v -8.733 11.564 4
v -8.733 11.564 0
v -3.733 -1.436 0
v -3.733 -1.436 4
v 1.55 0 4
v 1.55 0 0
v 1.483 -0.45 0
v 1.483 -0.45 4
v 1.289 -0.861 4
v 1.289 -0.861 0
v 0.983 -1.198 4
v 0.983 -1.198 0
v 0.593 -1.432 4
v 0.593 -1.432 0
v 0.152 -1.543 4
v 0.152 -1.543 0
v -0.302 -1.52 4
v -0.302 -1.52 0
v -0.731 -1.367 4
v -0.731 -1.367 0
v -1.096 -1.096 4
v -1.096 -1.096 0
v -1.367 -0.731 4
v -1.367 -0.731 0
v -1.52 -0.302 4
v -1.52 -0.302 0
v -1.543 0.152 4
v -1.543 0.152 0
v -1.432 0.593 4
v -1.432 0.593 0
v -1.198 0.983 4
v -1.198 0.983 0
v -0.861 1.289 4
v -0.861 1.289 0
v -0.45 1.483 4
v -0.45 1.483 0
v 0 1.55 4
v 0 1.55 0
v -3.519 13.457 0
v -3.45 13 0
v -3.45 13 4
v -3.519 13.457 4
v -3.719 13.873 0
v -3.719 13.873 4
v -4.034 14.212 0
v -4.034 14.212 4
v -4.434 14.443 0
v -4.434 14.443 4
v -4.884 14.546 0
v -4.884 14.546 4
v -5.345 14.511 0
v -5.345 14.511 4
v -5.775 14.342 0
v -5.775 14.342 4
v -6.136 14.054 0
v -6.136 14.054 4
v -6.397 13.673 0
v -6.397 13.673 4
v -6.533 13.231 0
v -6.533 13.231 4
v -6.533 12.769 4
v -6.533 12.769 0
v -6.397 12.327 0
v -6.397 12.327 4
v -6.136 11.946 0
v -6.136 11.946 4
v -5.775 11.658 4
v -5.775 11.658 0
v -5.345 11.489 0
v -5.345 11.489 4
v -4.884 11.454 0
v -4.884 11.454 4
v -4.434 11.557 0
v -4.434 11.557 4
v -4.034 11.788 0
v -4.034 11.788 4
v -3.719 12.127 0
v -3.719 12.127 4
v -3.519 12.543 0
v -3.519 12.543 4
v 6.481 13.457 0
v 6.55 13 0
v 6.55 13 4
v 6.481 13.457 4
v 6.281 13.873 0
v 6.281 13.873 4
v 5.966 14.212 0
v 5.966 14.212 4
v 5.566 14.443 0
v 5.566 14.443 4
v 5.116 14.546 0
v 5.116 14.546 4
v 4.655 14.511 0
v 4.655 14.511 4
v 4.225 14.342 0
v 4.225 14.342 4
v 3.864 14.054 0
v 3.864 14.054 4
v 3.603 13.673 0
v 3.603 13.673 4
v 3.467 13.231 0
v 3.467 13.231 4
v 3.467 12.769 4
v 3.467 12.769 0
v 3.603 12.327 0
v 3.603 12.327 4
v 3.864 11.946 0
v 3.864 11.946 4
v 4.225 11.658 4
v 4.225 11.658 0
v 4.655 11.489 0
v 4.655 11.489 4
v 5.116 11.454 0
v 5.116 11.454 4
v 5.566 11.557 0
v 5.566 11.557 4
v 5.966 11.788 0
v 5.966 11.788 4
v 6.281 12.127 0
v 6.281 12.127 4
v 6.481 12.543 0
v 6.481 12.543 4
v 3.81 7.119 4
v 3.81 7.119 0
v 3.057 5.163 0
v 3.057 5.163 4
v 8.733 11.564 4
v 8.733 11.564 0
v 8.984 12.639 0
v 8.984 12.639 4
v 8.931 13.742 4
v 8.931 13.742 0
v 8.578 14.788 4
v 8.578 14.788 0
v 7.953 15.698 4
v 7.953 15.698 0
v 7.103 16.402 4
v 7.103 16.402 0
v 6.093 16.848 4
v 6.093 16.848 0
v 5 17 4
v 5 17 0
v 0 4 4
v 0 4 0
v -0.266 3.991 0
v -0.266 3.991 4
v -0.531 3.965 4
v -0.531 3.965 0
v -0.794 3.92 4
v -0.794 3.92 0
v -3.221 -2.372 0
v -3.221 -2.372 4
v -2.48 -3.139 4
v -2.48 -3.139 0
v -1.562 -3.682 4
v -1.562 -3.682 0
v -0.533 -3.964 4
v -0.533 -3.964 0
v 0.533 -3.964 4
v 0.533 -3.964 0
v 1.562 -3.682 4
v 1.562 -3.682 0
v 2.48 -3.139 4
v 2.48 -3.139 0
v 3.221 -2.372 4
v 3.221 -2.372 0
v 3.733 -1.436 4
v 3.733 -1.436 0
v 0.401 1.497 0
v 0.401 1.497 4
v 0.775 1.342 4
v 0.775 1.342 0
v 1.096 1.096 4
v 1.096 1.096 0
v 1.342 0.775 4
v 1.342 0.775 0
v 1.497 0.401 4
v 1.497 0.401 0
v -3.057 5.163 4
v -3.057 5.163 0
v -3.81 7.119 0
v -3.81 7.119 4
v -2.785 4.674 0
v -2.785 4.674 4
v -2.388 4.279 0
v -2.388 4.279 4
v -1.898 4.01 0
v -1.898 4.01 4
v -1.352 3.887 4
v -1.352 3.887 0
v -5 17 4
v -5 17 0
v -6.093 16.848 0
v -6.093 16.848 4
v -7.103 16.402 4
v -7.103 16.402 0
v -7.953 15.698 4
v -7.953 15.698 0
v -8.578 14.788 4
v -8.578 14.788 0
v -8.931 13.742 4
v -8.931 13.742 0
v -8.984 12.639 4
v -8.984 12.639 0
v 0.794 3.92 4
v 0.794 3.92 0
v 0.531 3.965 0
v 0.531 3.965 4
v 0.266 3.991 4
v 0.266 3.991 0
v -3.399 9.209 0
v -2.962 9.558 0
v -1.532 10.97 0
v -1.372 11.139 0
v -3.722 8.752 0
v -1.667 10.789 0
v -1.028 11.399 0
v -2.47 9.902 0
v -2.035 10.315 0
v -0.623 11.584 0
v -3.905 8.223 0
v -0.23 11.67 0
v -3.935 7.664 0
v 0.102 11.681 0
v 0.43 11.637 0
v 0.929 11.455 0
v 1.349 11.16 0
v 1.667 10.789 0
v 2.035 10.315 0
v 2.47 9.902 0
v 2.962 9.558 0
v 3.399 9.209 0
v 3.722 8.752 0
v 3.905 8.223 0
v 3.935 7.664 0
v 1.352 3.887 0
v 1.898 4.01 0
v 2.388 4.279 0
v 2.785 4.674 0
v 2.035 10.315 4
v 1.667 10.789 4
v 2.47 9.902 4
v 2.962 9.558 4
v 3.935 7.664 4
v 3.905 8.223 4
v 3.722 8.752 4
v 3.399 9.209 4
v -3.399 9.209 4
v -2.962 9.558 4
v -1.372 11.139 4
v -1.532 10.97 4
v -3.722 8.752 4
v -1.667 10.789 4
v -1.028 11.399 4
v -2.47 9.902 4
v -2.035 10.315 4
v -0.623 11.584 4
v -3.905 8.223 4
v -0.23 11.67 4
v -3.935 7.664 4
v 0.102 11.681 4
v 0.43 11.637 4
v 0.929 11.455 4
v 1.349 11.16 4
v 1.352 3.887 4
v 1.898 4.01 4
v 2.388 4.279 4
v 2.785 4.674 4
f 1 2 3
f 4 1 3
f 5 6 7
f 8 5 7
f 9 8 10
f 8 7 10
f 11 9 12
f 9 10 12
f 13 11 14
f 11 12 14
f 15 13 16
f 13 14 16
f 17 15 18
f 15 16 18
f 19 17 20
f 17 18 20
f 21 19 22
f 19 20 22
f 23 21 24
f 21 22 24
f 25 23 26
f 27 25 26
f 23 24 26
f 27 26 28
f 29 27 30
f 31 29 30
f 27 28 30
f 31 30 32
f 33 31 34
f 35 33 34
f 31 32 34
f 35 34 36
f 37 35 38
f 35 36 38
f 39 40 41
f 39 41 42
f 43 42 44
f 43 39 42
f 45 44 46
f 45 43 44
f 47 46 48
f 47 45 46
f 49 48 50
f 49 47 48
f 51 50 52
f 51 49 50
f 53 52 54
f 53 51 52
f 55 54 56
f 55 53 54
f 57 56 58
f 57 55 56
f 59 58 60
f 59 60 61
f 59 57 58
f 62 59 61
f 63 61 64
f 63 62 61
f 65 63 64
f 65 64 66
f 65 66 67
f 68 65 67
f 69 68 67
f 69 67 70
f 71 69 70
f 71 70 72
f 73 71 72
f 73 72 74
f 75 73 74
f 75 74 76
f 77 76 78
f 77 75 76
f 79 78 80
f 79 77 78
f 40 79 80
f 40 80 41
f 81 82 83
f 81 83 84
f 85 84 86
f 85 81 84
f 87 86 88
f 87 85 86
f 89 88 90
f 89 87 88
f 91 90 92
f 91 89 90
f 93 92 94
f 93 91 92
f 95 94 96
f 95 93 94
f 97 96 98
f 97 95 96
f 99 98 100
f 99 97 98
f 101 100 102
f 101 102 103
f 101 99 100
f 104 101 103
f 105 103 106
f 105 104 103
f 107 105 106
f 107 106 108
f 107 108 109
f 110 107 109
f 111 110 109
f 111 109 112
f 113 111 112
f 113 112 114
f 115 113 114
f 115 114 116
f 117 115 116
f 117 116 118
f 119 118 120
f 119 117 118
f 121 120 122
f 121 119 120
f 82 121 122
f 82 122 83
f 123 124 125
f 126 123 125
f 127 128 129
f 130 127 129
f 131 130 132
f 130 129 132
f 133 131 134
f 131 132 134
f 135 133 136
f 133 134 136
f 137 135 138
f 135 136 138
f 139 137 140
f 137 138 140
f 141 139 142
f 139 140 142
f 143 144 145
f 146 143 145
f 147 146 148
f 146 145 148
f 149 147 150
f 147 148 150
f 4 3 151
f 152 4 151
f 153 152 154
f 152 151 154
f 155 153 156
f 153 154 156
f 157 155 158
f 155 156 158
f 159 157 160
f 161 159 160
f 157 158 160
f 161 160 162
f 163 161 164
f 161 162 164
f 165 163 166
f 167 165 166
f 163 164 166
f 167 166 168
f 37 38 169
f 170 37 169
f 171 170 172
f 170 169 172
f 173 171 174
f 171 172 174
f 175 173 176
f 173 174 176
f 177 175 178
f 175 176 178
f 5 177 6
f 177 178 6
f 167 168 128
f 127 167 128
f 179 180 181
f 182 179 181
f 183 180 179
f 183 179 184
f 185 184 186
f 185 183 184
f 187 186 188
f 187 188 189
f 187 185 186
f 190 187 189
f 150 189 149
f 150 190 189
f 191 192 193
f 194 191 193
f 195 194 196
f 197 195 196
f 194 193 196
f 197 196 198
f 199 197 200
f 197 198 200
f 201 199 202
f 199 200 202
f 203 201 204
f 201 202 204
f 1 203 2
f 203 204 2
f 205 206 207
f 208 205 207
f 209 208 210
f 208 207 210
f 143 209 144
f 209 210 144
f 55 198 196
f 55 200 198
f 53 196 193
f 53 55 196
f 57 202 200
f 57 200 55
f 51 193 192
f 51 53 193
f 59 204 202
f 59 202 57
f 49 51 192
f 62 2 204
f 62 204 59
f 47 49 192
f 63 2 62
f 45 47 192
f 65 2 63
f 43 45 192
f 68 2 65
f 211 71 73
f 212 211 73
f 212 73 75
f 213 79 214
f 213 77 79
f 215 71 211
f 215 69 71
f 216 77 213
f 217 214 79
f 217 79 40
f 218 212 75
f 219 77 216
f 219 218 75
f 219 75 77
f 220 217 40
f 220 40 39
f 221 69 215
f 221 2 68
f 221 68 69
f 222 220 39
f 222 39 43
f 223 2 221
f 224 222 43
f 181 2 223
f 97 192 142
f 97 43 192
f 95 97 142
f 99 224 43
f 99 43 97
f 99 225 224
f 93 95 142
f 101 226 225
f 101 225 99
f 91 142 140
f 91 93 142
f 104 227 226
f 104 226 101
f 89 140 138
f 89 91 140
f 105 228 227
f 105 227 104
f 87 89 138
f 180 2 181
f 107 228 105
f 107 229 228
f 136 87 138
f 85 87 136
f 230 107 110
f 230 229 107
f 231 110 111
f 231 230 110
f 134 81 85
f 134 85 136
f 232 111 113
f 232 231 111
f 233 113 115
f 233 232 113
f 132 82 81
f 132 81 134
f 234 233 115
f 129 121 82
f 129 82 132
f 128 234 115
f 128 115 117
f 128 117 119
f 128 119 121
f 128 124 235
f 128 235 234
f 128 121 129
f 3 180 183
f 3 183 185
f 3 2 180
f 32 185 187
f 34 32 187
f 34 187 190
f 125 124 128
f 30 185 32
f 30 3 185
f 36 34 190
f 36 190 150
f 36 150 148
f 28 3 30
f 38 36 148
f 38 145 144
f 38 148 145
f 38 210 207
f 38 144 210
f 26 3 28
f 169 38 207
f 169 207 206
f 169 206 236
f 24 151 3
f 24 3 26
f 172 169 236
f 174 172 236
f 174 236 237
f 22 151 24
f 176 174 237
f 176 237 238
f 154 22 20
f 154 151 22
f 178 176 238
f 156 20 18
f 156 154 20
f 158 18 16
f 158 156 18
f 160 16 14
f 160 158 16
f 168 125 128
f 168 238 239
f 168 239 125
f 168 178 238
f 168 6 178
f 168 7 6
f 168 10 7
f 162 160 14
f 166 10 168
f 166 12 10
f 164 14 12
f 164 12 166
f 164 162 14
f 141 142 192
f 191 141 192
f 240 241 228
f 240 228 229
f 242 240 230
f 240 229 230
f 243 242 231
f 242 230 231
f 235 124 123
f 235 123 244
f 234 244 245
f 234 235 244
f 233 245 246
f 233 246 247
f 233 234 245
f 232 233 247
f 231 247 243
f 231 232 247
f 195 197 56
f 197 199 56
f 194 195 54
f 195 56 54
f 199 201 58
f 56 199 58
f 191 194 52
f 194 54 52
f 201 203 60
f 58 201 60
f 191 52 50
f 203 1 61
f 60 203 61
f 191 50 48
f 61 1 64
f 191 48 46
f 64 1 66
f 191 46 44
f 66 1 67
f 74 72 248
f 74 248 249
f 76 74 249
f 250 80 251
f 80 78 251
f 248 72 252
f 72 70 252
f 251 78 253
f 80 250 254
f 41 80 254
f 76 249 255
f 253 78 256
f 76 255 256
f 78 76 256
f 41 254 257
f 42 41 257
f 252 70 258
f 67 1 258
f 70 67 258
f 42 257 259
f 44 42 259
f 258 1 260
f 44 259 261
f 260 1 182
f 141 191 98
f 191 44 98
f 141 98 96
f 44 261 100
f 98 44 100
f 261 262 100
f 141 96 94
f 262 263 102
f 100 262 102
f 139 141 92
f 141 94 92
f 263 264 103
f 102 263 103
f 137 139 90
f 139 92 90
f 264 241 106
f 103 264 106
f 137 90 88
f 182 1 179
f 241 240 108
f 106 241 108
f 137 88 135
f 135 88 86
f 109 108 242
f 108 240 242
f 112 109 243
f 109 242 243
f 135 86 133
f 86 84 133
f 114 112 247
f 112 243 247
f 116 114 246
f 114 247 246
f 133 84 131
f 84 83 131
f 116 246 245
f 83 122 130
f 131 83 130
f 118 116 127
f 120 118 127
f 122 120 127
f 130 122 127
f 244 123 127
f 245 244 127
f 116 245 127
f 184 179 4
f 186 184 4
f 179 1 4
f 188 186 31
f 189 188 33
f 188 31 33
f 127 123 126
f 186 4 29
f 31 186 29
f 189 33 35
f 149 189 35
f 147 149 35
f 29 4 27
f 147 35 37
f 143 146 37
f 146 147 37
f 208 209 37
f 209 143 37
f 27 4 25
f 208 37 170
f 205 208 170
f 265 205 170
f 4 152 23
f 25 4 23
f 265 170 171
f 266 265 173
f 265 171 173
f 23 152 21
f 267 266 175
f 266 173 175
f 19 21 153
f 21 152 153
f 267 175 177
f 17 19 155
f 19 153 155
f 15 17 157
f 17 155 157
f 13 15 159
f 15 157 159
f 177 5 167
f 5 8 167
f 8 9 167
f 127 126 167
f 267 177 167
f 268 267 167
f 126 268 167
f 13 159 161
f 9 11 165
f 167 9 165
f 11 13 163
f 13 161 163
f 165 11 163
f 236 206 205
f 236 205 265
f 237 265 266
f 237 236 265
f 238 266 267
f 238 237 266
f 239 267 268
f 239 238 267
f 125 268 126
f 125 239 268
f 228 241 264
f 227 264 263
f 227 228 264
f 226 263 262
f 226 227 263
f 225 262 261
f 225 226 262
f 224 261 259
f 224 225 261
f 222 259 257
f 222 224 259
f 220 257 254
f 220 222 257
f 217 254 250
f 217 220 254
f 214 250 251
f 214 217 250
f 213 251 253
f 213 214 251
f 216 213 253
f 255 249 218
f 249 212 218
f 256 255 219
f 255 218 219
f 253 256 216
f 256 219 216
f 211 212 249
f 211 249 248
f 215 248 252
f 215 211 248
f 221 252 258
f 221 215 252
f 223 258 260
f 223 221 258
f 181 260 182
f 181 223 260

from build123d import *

# Parameters (mm, degrees)
SKETCH_1_R      = 4
SKETCH_1_R_2    = 1.55
EXTRUDE_1_DEPTH = 4
FILLET_1_R      = 2
FILLET_2_R      = 2


with BuildPart() as part:
    # 草图1 → 凸台-拉伸1 (new body)
    # profile 1 of 8: a face of its own
    with BuildSketch(Plane.XY):
        with BuildLine():
            ThreePointArc((-3.733382425, -1.435916317), (-3.830813532, 1.151028966), (-2.323665602, 3.25585291))
            Line((-2.323665602, 3.25585291), (-4.54302561, 9.026188932))
            ThreePointArc((-4.54302561, 9.026188932), (-7.072182387, 9.578587988), (-8.733382425, 11.564083683))
            Line((-8.733382425, 11.564083683), (-3.733382425, -1.435916317))
        make_face()
    # profile 2 of 8: a face of its own
    with BuildSketch(Plane.XY):
        with BuildLine():
            Line((4.54302561, 9.026188932), (2.323665602, 3.25585291))
            ThreePointArc((2.323665602, 3.25585291), (3.556308649, 1.831029436), (4, 0))
            ThreePointArc((4, 0), (3.932780804, -0.730229519), (3.733382425, -1.435916317))
            Line((3.733382425, -1.435916317), (8.733382425, 11.564083683))
            ThreePointArc((8.733382425, 11.564083683), (7.072182387, 9.578587988), (4.54302561, 9.026188932))
        make_face()
    # profile 3 of 8: a face of its own
    with BuildSketch(Plane.XY):
        with Locations((5, 13)):
            Circle(SKETCH_1_R)
        with Locations((5, 13)):
            Circle(SKETCH_1_R_2, mode=Mode.SUBTRACT)
    # profile 4 of 8: a face of its own
    with BuildSketch(Plane.XY):
        with Locations((-5, 13)):
            Circle(SKETCH_1_R)
        with Locations((-5, 13)):
            Circle(SKETCH_1_R_2, mode=Mode.SUBTRACT)
    # profile 5 of 8: a face of its own
    with BuildSketch(Plane.XY):
        with BuildLine():
            Line((-1, 13), (0, 13))
            Line((0, 13), (0, 17))
            Line((0, 17), (-5, 17))
            ThreePointArc((-5, 17), (-2.171572875, 15.828427125), (-1, 13))
        make_face()
    # profile 6 of 8: a face of its own
    with BuildSketch(Plane.XY):
        with BuildLine():
            Line((0, 17), (0, 13))
            Line((0, 13), (1, 13))
            ThreePointArc((1, 13), (2.171572875, 15.828427125), (5, 17))
            Line((5, 17), (0, 17))
        make_face()
    # profile 7 of 8: a face of its own
    with BuildSketch(Plane.XY):
        with BuildLine():
            ThreePointArc((2.323665602, 3.25585291), (1.219956631, 3.809423292), (0, 4))
            ThreePointArc((0, 4), (-1.219956631, 3.809423292), (-2.323665602, 3.25585291))
            ThreePointArc((-2.323665602, 3.25585291), (-3.830813532, 1.151028966), (-3.733382425, -1.435916317))
            ThreePointArc((-3.733382425, -1.435916317), (0, -4), (3.733382425, -1.435916317))
            ThreePointArc((3.733382425, -1.435916317), (3.932780804, -0.730229519), (4, 0))
            ThreePointArc((4, 0), (3.556308649, 1.831029436), (2.323665602, 3.25585291))
        make_face()
        with BuildLine():
            ThreePointArc((1.55, 0), (-1.096015511, -1.096015511), (0, 1.55))
            ThreePointArc((0, 1.55), (1.096015511, 1.096015511), (1.55, 0))
        make_face(mode=Mode.SUBTRACT)
    # profile 8 of 8: a face of its own
    with BuildSketch(Plane.XY):
        with BuildLine():
            ThreePointArc((2.323665602, 3.25585291), (1.219956631, 3.809423292), (0, 4))
            ThreePointArc((0, 4), (-1.219956631, 3.809423292), (-2.323665602, 3.25585291))
            ThreePointArc((-2.323665602, 3.25585291), (-3.830813532, 1.151028966), (-3.733382425, -1.435916317))
            ThreePointArc((-3.733382425, -1.435916317), (0, -4), (3.733382425, -1.435916317))
            ThreePointArc((3.733382425, -1.435916317), (3.932780804, -0.730229519), (4, 0))
            ThreePointArc((4, 0), (3.556308649, 1.831029436), (2.323665602, 3.25585291))
        make_face()
        with BuildLine():
            ThreePointArc((1.55, 0), (-1.096015511, -1.096015511), (0, 1.55))
            ThreePointArc((0, 1.55), (1.096015511, 1.096015511), (1.55, 0))
        make_face(mode=Mode.SUBTRACT)
    extrude(amount=EXTRUDE_1_DEPTH)

    # 圆角1
    # the kernel refuses this fillet: 2 mm, written as the material it adds along each edge
    with BuildSketch(Plane(origin=(-4.54302561, 9.026188932, 0), x_dir=(0.9477918493687586, 0.3188896521841818, 0), z_dir=(0, 0, 1))) as fillet_1_piece_1:
        with BuildLine():
            CenterArc((2.085226569, -1.956035073), FILLET_1_R, 102.035790206, 80.405931773)
            Line((0.087042425, -2.041241452), (0, 0))
            ThreePointArc((0, 0), (0.834090628, -0.087929854), (1.668181255, 0))
        make_face()
    extrude(amount=4)
    with BuildSketch(Plane(origin=(-2.323665602, 3.25585291, 0), x_dir=(-0.3589790793088693, 0.9333456062030594, 0), z_dir=(0, 0, 1)), Plane(origin=(4.54302561, 9.026188932, 0), x_dir=(-0.3589790793088692, -0.9333456062030594, 0), z_dir=(0, 0, 1))) as fillet_1_piece_2:
        with BuildLine():
            CenterArc((2.043096437, -2), FILLET_1_R, 90, 80.405931773)
            ThreePointArc((0.071069843, -1.666666667), (0.123384942, -0.829587241), (0, 0))
            Line((0, 0), (2.043096437, 0))
        make_face()
    extrude(amount=4)
    with BuildSketch(Plane(origin=(2.323665602, 3.25585291, 0), x_dir=(0.35897907930886913, 0.9333456062030596, 0), z_dir=(0, 0, 1))) as fillet_1_piece_3:
        with BuildLine():
            CenterArc((2.043096437, 2), FILLET_1_R, 189.594068227, 80.405931773)
            ThreePointArc((0.071069843, 1.666666667), (0.123384942, 0.829587241), (0, 0))
            Line((0, 0), (2.043096437, 0))
        make_face()
    extrude(amount=4)
    with BuildSketch(Plane(origin=(1, 13, 0), x_dir=(-1, 0, 0), z_dir=(0, 0, 1))) as fillet_1_piece_4:
        with BuildLine():
            CenterArc((1.656854249, 2), FILLET_1_R, 199.471220634, 70.528779366)
            ThreePointArc((-0.228763834, 1.333333333), (-0.057605761, 0.676407915), (0, 0))
            Line((0, 0), (1.656854249, 0))
        make_face()
    extrude(amount=4)
    with BuildSketch(Plane(origin=(-1, 13, 0), x_dir=(-0.16910197872576255, -0.9855985596534887, 0), z_dir=(0, 0, 1))) as fillet_1_piece_5:
        with BuildLine():
            CenterArc((1.691019787, 1.971197119), FILLET_1_R, 189.735610317, 70.528779366)
            Line((-0.280177332, 1.632993162), (0, 0))
            ThreePointArc((0, 0), (0.676407915, 0.057605761), (1.35281583, 0))
        make_face()
    extrude(amount=4)

    # 圆角2
    fillet_2_edges = [part.edges().sort_by_distance(p)[0] for p in [
        (0, 12.889058627, 2),
    ]]
    fillet(fillet_2_edges, radius=FILLET_2_R)


solid = part.part
